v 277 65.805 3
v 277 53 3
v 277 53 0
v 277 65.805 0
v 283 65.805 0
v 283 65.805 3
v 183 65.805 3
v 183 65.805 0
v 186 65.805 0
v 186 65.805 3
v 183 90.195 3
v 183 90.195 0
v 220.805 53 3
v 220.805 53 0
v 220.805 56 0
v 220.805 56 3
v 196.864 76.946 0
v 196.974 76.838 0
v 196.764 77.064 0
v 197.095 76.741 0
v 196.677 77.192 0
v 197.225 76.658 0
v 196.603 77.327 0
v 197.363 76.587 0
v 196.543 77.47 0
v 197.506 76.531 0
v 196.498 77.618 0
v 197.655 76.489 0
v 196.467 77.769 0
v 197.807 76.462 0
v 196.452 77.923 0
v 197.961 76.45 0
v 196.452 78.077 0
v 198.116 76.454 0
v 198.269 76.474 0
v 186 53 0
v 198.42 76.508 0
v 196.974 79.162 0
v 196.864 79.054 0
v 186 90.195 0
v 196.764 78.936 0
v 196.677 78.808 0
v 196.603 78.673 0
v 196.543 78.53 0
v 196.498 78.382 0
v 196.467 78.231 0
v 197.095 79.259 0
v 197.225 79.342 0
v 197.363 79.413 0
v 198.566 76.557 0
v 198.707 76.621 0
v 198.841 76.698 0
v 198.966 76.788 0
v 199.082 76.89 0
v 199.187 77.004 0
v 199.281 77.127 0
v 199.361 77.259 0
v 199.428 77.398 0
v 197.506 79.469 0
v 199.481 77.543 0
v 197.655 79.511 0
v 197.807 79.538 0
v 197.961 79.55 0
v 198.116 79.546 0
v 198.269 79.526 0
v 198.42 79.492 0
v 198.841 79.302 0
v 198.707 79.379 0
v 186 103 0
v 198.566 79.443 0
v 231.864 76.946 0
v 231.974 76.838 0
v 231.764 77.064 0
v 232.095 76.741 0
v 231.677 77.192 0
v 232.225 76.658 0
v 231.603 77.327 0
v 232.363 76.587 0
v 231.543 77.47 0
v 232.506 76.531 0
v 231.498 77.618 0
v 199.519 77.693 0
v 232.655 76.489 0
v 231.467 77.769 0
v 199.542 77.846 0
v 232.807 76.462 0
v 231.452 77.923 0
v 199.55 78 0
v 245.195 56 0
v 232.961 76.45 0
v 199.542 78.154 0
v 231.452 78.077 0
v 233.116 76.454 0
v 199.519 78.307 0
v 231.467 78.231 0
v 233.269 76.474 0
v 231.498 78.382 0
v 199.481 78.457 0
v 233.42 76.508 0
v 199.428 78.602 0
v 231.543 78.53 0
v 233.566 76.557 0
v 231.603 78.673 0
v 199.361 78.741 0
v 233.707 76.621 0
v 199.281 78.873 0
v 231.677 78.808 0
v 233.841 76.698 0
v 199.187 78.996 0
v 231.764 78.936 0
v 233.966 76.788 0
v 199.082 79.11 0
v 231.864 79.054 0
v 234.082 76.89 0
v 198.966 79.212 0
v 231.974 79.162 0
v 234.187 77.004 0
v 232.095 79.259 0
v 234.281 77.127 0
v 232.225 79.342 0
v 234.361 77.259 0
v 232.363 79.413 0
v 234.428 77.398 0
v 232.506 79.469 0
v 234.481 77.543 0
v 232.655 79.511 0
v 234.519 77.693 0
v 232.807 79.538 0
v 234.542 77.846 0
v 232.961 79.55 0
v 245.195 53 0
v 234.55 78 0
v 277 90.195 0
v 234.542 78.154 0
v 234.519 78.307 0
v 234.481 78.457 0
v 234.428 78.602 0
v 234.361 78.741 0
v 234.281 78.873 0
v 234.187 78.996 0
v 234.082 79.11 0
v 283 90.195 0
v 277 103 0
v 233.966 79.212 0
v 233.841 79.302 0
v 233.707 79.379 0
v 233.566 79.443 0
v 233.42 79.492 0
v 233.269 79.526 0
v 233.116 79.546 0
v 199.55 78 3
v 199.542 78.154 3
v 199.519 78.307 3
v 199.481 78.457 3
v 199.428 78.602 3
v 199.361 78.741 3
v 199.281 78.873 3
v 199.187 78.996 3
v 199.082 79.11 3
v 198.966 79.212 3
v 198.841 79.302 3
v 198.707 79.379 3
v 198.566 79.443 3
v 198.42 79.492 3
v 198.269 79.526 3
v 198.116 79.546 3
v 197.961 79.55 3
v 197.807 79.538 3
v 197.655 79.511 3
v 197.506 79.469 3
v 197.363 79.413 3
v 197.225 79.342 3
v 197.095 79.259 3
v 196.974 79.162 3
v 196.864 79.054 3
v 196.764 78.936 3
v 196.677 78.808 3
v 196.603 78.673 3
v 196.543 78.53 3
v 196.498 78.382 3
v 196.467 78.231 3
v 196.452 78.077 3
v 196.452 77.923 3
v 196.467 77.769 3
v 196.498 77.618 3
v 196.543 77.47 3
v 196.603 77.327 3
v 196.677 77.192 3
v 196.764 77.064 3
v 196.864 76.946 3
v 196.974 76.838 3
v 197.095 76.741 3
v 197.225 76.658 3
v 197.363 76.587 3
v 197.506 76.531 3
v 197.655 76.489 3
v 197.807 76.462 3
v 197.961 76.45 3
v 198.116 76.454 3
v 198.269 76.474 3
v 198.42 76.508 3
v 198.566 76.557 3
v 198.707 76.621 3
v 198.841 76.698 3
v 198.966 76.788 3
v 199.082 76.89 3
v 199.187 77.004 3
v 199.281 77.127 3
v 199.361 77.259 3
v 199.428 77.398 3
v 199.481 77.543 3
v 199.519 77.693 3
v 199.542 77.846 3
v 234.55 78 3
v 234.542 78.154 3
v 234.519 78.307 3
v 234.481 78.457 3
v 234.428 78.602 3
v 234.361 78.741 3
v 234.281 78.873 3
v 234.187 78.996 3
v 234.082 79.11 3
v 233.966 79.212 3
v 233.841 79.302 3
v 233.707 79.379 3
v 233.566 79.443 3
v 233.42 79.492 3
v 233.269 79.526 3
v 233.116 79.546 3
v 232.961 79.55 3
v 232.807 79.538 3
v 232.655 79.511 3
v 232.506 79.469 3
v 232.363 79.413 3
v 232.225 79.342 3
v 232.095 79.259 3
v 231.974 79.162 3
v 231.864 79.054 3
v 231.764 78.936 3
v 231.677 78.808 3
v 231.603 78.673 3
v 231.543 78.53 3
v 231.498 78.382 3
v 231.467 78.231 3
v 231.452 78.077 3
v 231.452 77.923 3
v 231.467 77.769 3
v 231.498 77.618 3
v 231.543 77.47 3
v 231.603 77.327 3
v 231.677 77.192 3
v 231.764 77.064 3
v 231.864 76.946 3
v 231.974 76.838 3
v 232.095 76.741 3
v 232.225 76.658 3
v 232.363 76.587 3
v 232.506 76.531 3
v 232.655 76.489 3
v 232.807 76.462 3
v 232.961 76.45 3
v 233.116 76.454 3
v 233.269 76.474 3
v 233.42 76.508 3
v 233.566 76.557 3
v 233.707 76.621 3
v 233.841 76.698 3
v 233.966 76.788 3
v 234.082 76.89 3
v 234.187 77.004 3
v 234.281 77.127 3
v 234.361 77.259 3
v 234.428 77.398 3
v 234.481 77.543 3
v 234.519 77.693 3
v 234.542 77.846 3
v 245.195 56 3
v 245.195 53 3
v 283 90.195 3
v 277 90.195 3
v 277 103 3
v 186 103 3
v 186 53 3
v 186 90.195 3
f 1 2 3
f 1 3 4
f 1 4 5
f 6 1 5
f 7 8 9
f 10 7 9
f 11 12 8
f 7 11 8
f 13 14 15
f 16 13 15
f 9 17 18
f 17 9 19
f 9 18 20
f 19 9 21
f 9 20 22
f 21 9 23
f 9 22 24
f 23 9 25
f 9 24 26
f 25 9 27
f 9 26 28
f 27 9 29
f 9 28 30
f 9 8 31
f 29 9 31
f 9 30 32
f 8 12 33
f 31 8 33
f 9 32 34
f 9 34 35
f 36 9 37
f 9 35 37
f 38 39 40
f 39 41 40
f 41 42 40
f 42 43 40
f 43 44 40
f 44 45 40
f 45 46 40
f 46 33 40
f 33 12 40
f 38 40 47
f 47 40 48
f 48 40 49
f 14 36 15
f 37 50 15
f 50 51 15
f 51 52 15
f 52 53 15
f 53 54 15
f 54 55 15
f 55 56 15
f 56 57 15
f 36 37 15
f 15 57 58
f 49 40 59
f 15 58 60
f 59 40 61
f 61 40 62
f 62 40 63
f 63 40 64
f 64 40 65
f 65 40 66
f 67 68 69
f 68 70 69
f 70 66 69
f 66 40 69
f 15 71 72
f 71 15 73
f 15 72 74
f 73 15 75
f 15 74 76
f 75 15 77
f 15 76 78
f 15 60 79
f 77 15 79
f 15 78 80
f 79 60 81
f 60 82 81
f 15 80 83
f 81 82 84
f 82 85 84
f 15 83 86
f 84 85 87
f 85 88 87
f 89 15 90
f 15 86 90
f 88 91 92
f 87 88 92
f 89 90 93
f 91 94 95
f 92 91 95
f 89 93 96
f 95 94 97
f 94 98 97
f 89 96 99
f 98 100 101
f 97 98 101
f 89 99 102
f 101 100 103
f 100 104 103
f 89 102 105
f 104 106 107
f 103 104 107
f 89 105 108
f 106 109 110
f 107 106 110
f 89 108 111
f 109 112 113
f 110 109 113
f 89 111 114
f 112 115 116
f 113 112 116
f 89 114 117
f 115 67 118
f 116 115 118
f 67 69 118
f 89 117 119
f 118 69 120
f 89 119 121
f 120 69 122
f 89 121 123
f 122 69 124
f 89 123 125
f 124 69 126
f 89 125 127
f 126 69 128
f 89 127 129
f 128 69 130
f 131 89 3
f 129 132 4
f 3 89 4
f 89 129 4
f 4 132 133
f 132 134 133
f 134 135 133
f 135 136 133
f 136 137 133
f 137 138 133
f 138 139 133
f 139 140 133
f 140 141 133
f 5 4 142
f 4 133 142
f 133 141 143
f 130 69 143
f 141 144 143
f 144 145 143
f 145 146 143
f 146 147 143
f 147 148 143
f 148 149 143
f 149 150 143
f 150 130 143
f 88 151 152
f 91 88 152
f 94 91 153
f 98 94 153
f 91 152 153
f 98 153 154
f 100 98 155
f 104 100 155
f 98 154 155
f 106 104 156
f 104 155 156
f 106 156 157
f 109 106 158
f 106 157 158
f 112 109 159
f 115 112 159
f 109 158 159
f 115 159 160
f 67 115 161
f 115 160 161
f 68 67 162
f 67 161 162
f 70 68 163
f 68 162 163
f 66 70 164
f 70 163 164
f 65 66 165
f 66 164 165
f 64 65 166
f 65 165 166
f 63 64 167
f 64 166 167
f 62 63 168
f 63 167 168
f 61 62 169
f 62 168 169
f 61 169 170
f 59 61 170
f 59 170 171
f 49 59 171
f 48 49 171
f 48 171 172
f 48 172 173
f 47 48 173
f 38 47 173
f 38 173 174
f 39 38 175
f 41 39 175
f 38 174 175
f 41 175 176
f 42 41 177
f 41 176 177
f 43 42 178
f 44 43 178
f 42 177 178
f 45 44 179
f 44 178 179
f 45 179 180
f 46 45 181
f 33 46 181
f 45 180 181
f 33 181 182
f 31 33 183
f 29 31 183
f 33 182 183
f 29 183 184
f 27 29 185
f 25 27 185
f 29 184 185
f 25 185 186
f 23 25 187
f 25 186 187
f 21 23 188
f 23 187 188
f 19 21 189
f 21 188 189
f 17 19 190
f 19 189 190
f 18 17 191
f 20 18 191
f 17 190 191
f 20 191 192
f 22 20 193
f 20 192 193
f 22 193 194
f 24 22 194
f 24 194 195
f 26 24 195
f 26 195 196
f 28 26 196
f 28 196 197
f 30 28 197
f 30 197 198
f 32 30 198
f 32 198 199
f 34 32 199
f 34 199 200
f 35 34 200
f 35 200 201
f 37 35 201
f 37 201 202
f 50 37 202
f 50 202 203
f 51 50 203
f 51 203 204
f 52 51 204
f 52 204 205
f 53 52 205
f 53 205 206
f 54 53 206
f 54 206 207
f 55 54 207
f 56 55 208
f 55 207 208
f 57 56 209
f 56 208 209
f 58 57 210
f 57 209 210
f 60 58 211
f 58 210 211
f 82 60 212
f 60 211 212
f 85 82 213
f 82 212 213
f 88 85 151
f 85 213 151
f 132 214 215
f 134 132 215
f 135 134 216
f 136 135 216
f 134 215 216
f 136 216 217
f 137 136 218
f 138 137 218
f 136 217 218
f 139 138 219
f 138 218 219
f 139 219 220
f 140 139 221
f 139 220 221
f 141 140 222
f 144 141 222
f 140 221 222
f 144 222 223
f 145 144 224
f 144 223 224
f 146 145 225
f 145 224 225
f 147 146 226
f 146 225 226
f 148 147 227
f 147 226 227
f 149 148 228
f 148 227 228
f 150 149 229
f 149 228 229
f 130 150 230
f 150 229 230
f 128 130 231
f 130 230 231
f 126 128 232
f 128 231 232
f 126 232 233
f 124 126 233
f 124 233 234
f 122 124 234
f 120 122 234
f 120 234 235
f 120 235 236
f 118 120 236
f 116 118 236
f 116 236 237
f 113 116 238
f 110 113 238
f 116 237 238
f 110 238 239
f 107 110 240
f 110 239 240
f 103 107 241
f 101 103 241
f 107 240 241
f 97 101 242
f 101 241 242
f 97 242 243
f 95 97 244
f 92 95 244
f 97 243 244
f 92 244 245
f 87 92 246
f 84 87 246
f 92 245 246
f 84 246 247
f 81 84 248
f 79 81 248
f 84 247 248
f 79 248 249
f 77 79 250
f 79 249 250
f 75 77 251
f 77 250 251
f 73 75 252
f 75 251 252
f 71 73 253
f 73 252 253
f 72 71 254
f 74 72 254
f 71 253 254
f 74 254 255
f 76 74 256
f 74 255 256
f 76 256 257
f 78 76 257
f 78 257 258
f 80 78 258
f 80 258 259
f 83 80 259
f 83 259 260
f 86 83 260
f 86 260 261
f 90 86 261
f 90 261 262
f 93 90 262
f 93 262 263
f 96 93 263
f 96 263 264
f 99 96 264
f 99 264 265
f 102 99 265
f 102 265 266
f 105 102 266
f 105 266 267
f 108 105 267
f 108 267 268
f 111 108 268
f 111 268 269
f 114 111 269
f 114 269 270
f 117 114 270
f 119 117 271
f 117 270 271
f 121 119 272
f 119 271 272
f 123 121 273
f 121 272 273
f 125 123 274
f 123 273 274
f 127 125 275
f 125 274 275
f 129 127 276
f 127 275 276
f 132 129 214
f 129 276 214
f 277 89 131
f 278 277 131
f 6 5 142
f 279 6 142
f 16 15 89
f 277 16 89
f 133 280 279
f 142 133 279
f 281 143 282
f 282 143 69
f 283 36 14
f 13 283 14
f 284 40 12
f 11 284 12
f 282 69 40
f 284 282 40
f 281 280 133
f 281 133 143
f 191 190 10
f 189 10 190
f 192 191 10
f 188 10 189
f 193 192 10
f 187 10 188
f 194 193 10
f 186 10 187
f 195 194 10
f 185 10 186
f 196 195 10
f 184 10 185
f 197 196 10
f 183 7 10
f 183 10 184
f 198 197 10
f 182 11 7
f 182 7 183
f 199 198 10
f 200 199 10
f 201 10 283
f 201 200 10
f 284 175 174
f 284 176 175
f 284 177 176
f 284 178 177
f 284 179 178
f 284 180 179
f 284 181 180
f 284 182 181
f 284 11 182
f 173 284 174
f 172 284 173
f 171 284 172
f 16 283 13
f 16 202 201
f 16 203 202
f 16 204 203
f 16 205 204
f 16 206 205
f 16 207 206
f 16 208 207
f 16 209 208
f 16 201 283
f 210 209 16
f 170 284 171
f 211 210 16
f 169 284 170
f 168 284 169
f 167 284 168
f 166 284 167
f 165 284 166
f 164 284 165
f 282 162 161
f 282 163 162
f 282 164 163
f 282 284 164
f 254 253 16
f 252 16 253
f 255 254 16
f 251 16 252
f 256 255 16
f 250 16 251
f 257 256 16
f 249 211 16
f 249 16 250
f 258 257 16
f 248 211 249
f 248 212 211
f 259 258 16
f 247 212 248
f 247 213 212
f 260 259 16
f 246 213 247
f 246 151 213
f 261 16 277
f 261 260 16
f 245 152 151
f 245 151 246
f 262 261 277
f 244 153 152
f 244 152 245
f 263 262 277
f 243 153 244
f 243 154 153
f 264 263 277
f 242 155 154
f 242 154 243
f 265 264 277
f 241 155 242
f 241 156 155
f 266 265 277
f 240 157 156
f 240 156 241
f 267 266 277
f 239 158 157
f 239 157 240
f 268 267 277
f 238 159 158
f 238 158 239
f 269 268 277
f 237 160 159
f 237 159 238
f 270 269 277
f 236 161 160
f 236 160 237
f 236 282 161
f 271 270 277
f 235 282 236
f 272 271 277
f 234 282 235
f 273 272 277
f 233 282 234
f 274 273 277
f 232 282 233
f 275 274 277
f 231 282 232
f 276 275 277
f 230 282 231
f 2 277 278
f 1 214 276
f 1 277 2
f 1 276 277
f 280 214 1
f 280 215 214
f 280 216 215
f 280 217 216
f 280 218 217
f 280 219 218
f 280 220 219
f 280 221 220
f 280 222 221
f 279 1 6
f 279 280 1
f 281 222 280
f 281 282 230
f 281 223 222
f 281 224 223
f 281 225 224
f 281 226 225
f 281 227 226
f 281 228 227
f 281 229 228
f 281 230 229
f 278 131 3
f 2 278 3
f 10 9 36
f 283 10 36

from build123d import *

# Parameters (mm, degrees)
SALIENTE_EXTRUIR1_DEPTH = 3
CROQUIS2_R              = 1.55
CORTAR_EXTRUIR1_DEPTH   = 3
CROQUIS4_W              = 3
CROQUIS4_H              = 12.805
CORTAR_EXTRUIR2_DEPTH   = 10


with BuildPart() as part:
    # Model → Saliente-Extruir1 (new body)
    with BuildSketch(Plane.XY):
        Polygon((186, 103), (186, 90.195), (183, 90.195), (183, 65.805), (186, 65.805), (186, 53), (220.805, 53), (220.805, 56), (245.195, 56), (245.195, 53), (269.585, 53), (280, 53), (280, 65.805), (283, 65.805), (283, 90.195), (280, 90.195), (280, 103), align=None)
    extrude(amount=SALIENTE_EXTRUIR1_DEPTH)

    # Croquis2 → Cortar-Extruir1 (cut)
    with BuildSketch(Plane.XY.offset(3)):
        with Locations((233, 78)):
            Circle(CROQUIS2_R)
        with Locations((198, 78)):
            Circle(CROQUIS2_R)
    extrude(amount=-CORTAR_EXTRUIR1_DEPTH, mode=Mode.SUBTRACT)

    # Croquis4 → Cortar-Extruir2 (cut)
    with BuildSketch(Plane.XY.offset(3)):
        with Locations((278.5, 96.5975)):
            Rectangle(CROQUIS4_W, CROQUIS4_H)
        with Locations((278.5, 59.4025)):
            Rectangle(CROQUIS4_W, CROQUIS4_H)
    extrude(amount=-CORTAR_EXTRUIR2_DEPTH, mode=Mode.SUBTRACT)


solid = part.part
